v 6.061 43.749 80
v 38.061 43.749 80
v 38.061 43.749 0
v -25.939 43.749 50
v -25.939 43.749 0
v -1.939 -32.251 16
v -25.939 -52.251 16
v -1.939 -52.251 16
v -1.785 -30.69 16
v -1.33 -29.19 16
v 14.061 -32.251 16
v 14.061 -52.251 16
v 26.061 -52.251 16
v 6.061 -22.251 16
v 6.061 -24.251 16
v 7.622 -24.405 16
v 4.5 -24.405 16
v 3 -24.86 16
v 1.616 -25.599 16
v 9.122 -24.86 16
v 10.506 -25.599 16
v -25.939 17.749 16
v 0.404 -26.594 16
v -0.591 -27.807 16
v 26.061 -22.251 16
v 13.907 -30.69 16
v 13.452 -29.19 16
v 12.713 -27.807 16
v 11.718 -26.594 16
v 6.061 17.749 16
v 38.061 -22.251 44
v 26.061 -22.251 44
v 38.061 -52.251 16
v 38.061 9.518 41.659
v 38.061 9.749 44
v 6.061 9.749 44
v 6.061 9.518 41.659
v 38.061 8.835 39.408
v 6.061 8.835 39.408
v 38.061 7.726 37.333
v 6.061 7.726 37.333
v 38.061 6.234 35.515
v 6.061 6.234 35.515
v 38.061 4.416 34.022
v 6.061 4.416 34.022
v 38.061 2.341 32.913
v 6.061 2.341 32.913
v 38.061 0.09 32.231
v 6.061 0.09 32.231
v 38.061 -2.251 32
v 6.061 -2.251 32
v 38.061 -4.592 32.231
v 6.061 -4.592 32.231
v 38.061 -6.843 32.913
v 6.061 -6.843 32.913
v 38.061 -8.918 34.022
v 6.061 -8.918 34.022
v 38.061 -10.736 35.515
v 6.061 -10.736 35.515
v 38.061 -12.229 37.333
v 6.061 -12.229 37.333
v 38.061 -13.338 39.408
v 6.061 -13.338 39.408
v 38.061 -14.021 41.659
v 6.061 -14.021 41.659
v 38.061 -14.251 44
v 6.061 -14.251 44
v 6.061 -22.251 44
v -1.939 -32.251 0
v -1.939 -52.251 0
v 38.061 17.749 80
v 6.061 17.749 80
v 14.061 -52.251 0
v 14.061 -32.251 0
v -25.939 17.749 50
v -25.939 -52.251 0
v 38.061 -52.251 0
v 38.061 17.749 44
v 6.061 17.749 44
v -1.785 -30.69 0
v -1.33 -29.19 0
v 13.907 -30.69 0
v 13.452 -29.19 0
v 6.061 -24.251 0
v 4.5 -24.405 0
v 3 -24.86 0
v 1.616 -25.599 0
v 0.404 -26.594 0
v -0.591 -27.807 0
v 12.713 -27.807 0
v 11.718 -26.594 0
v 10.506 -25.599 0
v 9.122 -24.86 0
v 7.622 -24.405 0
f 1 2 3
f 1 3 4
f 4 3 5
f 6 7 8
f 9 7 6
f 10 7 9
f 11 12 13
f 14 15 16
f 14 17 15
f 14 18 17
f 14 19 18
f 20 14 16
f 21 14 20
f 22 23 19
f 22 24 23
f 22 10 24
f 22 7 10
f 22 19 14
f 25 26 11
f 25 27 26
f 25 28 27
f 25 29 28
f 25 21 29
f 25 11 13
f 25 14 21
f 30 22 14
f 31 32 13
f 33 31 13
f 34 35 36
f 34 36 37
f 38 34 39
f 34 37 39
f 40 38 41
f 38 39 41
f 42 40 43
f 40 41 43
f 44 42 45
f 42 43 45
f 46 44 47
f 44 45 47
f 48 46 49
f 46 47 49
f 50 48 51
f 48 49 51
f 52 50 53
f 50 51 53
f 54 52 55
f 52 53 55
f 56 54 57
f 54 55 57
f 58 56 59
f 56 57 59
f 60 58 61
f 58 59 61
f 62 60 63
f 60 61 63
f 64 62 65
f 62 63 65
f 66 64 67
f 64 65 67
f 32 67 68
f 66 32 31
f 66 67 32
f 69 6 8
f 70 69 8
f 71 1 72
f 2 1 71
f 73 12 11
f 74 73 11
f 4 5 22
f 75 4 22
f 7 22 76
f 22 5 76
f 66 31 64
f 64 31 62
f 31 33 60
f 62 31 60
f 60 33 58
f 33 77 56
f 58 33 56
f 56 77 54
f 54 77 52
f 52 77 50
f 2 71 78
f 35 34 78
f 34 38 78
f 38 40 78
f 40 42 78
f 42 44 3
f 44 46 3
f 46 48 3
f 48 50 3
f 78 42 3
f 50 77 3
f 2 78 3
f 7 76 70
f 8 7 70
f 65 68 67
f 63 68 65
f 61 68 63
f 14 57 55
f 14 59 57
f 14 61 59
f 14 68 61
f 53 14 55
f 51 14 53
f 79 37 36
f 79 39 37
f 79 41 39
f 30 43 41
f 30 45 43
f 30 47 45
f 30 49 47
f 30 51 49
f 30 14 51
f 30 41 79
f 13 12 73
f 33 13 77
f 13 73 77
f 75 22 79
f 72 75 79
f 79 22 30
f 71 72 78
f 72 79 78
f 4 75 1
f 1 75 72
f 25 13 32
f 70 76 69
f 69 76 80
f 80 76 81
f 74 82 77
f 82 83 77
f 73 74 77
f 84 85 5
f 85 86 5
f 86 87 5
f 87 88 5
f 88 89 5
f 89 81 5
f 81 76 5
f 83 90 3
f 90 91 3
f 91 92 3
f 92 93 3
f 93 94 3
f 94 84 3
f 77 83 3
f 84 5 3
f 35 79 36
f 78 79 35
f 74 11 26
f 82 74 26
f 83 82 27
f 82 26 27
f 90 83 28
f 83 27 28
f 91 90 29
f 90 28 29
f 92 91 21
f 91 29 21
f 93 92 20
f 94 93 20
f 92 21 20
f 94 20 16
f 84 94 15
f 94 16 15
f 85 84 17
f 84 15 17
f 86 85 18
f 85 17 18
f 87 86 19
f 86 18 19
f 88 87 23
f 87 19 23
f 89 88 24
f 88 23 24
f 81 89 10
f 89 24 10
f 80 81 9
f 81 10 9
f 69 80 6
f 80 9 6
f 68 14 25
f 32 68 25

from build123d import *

# Parameters (mm, degrees)
F0_W      = 64
F0_H      = 96
F1_DEPTH  = 16
F3_DEPTH  = 25
F4_W      = 12
F4_H      = 30
F5_DEPTH  = 28
F7_DEPTH  = 25
F8_W      = 32
F8_H      = 40
F9_DEPTH  = 28
F10_R     = 12
F11_DEPTH = 52
F13_DEPTH = 64
F15_DEPTH = 30


with BuildPart() as f1:
    # F0 (on Top) → F1 (new body)
    with BuildSketch(Plane.XY):
        with Locations((6.061017856, -4.2511862218)):
            Rectangle(F0_W, F0_H)
    extrude(amount=F1_DEPTH)

    # F2 (on face) → F3 (cut)
    with BuildSketch(Plane.XY.offset(16)):
        with BuildLine():
            Line((-1.938982144, -32.2511862218), (-1.938982144, -52.2511862218))
            Line((-1.938982144, -52.2511862218), (14.061017856, -52.2511862218))
            Line((14.061017856, -52.2511862218), (14.061017856, -32.2511862218))
            ThreePointArc((14.061017856, -32.2511862218), (6.061017856, -40.2511862218), (-1.938982144, -32.2511862218))
        make_face()
        with BuildLine():
            ThreePointArc((14.061017856, -32.2511862218), (6.061017856, -24.2511862218), (-1.938982144, -32.2511862218))
            Line((-1.938982144, -32.2511862218), (14.061017856, -32.2511862218))
        make_face()
        with BuildLine():
            Line((14.061017856, -32.2511862218), (-1.938982144, -32.2511862218))
            ThreePointArc((-1.938982144, -32.2511862218), (6.061017856, -40.2511862218), (14.061017856, -32.2511862218))
        make_face()
    extrude(amount=-F3_DEPTH, mode=Mode.SUBTRACT)

    # F4 (on face) → F5 (join)
    with BuildSketch(Plane.XY.offset(16)):
        with Locations((32.061017856, -37.2511862218)):
            Rectangle(F4_W, F4_H)
    extrude(amount=F5_DEPTH)

    # F6 (on face) → F7 (cut)
    with BuildSketch(Plane(origin=(26.061017856, 0, 0), x_dir=(0, -1, 0), z_dir=(-1, 0, 0))):
        Polygon((52.2511862218, 44), (22.2511862218, 44), (52.2511862218, 16), align=None)
    extrude(amount=-F7_DEPTH, mode=Mode.SUBTRACT)

    # F8 (on face) → F9 (join)
    with BuildSketch(Plane.XY.offset(16)):
        with Locations((22.061017856, -2.2511862218)):
            Rectangle(F8_W, F8_H)
    extrude(amount=F9_DEPTH)

    # F10 (on face) → F11 (cut)
    with BuildSketch(Plane(origin=(6.061017856, 0, 0), x_dir=(0, -1, 0), z_dir=(-1, 0, 0))):
        with Locations((2.2511862218, 44)):
            Circle(F10_R)
    extrude(amount=-F11_DEPTH, mode=Mode.SUBTRACT)

    # F12 (on face) → F13 (join)
    with BuildSketch(Plane.XY.offset(16)):
        Polygon((-25.938982144, 17.7488137782), (6.061017856, 17.7488137782), (38.061017856, 17.7488137782), (38.061017856, 43.7488137782), (-25.938982144, 43.7488137782), align=None)
    extrude(amount=F13_DEPTH)

    # F14 (on face) → F15 (cut)
    with BuildSketch(Plane.XZ.offset(-17.7488137782)):
        Polygon((-25.938982144, 50), (6.061017856, 80), (-25.938982144, 80), align=None)
    extrude(amount=-F15_DEPTH, mode=Mode.SUBTRACT)


solid = f1.part
